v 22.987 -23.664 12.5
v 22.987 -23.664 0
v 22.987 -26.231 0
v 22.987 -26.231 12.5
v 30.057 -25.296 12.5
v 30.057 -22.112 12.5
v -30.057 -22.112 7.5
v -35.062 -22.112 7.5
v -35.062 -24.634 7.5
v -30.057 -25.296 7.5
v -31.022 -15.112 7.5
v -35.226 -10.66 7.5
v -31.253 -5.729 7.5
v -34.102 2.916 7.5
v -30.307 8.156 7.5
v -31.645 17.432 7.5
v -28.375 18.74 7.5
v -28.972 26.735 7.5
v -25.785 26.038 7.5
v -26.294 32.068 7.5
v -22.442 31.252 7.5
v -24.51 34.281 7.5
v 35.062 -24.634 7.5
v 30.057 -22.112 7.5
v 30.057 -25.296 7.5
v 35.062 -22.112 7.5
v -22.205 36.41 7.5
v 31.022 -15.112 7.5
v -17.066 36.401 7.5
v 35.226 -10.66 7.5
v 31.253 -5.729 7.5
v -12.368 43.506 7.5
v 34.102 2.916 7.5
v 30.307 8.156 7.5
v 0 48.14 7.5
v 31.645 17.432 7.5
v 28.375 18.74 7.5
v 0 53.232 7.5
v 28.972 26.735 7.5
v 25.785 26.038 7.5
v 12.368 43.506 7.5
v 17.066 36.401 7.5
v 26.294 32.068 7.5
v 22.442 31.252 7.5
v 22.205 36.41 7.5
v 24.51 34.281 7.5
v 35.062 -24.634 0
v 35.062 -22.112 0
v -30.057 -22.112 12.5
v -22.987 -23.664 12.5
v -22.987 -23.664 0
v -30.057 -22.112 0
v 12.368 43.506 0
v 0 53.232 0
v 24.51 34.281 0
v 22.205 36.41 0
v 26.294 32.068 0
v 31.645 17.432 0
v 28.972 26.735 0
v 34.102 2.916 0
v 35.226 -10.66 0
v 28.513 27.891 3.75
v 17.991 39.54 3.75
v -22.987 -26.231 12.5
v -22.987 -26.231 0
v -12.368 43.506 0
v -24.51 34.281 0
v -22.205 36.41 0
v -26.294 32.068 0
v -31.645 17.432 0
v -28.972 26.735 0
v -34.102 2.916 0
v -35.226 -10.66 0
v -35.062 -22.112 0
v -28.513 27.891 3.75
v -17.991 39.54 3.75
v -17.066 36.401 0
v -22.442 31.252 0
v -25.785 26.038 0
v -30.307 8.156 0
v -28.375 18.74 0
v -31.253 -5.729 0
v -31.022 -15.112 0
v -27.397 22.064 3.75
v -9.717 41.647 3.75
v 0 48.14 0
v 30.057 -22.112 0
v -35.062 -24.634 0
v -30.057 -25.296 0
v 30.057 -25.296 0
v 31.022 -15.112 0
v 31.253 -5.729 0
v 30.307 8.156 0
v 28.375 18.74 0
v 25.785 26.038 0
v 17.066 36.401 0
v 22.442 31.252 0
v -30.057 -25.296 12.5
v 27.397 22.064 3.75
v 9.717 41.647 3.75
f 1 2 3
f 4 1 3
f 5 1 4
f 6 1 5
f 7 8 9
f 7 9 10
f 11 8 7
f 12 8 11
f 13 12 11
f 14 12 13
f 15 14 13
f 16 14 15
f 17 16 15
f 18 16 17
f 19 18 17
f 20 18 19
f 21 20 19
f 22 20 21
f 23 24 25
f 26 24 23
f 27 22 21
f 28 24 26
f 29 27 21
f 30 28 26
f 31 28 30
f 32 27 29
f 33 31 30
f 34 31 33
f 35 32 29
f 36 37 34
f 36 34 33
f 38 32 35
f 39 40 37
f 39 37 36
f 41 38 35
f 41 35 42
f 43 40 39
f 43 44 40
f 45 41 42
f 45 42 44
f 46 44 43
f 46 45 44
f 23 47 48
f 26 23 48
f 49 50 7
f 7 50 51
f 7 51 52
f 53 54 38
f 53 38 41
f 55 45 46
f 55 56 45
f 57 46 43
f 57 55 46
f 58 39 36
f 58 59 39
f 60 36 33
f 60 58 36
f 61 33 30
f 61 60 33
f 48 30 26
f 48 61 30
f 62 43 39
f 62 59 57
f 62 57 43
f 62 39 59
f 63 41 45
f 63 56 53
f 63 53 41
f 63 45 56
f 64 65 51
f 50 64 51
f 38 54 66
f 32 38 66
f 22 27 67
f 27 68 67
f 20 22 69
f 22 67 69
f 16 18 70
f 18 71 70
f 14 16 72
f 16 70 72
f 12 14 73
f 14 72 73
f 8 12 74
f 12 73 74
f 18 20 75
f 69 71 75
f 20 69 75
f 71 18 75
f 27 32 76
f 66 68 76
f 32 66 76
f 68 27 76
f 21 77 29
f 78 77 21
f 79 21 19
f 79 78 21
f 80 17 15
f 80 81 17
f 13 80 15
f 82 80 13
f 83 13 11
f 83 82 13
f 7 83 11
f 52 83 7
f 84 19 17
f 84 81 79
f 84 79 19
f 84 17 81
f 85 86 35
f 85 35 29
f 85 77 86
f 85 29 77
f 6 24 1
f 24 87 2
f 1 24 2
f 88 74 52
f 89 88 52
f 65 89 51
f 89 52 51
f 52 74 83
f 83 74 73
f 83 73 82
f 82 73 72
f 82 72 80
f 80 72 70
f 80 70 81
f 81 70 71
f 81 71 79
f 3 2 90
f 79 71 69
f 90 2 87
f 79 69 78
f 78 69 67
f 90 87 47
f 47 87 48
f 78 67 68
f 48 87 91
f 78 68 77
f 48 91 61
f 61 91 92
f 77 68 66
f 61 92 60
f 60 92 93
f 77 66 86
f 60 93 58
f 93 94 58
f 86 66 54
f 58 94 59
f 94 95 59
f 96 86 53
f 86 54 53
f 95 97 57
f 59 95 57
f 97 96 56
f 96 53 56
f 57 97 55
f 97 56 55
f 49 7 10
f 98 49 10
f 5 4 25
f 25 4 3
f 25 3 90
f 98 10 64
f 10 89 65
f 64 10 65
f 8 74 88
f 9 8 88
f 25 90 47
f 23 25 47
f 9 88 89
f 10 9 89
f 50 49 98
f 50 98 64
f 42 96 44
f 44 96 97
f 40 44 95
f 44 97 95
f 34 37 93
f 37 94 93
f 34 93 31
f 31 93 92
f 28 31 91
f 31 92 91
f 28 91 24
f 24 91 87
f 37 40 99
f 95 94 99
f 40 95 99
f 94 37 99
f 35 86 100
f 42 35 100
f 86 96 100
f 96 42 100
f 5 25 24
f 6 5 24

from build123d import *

# Parameters (mm, degrees)
F1_DEPTH = 7.5
F2_DEPTH = 12.5
F3_DEPTH = 12.5


with BuildPart() as f1:
    # F0 (on Top) → F1 (new body)
    with BuildSketch(Plane.XY):
        Polygon((-30.0569813699, -22.1116133034), (-35.0622199476, -22.1116133034), (-35.0622199476, -24.6335370466), (-30.0569813699, -25.2958359819), align=None)
        Polygon((30.0569813699, -25.2958359819), (30.0569813699, -22.1116133034), (22.9866988957, -23.6642416567), (22.9866988957, -26.2313839048), align=None)
        Polygon((-22.9866988957, -23.6642416567), (-30.0569813699, -22.1116133034), (-30.0569813699, -25.2958359819), (-22.9866988957, -26.2313839048), align=None)
        with BuildLine():
            Line((0, 48.1400117278), (0, 53.2320290804))
            add(Edge.make_bspline(
                [(0, 53.2320290804), (-18.8189297915, 37.2051112354), (-30.7187833667, 38.5866822973), (-36.2555484941, -9.0163541808), (-35.0622199476, -22.1116133034)],
                knots=[0, 0, 0, 0, 0.4651611799, 1, 1, 1, 1], degree=3))
            Line((-35.0622199476, -22.1116133034), (-30.0569813699, -22.1116133034))
            add(Edge.make_bspline(
                [(0, 48.1400117278), (-16.1610092806, 37.1547305533), (-31.2765203399, 30.3487738602), (-32.1505479515, -13.5164428502), (-30.0569813699, -22.1116133034)],
                knots=[0, 0, 0, 0, 0.480374946, 1, 1, 1, 1], degree=3))
        make_face()
        with BuildLine():
            add(Edge.make_bspline(
                [(0, 53.2320290804), (18.8189297915, 37.2051112354), (30.7187833667, 38.5866822973), (36.2555484941, -9.0163541808), (35.0622199476, -22.1116133034)],
                knots=[0, 0, 0, 0, 0.4651611799, 1, 1, 1, 1], degree=3))
            Line((0, 53.2320290804), (0, 48.1400117278))
            add(Edge.make_bspline(
                [(0, 48.1400117278), (16.1610092806, 37.1547305533), (31.2765203399, 30.3487738602), (32.1505479515, -13.5164428502), (30.0569813699, -22.1116133034)],
                knots=[0, 0, 0, 0, 0.480374946, 1, 1, 1, 1], degree=3))
            Line((30.0569813699, -22.1116133034), (35.0622199476, -22.1116133034))
        make_face()
        Polygon((35.0622199476, -24.6335370466), (35.0622199476, -22.1116133034), (30.0569813699, -22.1116133034), (30.0569813699, -25.2958359819), align=None)
    extrude(amount=F1_DEPTH)

    # F0 (on Top) → F2 (join)
    with BuildSketch(Plane.XY):
        Polygon((30.0569813699, -25.2958359819), (30.0569813699, -22.1116133034), (22.9866988957, -23.6642416567), (22.9866988957, -26.2313839048), align=None)
    extrude(amount=F2_DEPTH)

    # F0 (on Top) → F3 (join)
    with BuildSketch(Plane.XY):
        Polygon((-22.9866988957, -23.6642416567), (-30.0569813699, -22.1116133034), (-30.0569813699, -25.2958359819), (-22.9866988957, -26.2313839048), align=None)
    extrude(amount=F3_DEPTH)


solid = f1.part
